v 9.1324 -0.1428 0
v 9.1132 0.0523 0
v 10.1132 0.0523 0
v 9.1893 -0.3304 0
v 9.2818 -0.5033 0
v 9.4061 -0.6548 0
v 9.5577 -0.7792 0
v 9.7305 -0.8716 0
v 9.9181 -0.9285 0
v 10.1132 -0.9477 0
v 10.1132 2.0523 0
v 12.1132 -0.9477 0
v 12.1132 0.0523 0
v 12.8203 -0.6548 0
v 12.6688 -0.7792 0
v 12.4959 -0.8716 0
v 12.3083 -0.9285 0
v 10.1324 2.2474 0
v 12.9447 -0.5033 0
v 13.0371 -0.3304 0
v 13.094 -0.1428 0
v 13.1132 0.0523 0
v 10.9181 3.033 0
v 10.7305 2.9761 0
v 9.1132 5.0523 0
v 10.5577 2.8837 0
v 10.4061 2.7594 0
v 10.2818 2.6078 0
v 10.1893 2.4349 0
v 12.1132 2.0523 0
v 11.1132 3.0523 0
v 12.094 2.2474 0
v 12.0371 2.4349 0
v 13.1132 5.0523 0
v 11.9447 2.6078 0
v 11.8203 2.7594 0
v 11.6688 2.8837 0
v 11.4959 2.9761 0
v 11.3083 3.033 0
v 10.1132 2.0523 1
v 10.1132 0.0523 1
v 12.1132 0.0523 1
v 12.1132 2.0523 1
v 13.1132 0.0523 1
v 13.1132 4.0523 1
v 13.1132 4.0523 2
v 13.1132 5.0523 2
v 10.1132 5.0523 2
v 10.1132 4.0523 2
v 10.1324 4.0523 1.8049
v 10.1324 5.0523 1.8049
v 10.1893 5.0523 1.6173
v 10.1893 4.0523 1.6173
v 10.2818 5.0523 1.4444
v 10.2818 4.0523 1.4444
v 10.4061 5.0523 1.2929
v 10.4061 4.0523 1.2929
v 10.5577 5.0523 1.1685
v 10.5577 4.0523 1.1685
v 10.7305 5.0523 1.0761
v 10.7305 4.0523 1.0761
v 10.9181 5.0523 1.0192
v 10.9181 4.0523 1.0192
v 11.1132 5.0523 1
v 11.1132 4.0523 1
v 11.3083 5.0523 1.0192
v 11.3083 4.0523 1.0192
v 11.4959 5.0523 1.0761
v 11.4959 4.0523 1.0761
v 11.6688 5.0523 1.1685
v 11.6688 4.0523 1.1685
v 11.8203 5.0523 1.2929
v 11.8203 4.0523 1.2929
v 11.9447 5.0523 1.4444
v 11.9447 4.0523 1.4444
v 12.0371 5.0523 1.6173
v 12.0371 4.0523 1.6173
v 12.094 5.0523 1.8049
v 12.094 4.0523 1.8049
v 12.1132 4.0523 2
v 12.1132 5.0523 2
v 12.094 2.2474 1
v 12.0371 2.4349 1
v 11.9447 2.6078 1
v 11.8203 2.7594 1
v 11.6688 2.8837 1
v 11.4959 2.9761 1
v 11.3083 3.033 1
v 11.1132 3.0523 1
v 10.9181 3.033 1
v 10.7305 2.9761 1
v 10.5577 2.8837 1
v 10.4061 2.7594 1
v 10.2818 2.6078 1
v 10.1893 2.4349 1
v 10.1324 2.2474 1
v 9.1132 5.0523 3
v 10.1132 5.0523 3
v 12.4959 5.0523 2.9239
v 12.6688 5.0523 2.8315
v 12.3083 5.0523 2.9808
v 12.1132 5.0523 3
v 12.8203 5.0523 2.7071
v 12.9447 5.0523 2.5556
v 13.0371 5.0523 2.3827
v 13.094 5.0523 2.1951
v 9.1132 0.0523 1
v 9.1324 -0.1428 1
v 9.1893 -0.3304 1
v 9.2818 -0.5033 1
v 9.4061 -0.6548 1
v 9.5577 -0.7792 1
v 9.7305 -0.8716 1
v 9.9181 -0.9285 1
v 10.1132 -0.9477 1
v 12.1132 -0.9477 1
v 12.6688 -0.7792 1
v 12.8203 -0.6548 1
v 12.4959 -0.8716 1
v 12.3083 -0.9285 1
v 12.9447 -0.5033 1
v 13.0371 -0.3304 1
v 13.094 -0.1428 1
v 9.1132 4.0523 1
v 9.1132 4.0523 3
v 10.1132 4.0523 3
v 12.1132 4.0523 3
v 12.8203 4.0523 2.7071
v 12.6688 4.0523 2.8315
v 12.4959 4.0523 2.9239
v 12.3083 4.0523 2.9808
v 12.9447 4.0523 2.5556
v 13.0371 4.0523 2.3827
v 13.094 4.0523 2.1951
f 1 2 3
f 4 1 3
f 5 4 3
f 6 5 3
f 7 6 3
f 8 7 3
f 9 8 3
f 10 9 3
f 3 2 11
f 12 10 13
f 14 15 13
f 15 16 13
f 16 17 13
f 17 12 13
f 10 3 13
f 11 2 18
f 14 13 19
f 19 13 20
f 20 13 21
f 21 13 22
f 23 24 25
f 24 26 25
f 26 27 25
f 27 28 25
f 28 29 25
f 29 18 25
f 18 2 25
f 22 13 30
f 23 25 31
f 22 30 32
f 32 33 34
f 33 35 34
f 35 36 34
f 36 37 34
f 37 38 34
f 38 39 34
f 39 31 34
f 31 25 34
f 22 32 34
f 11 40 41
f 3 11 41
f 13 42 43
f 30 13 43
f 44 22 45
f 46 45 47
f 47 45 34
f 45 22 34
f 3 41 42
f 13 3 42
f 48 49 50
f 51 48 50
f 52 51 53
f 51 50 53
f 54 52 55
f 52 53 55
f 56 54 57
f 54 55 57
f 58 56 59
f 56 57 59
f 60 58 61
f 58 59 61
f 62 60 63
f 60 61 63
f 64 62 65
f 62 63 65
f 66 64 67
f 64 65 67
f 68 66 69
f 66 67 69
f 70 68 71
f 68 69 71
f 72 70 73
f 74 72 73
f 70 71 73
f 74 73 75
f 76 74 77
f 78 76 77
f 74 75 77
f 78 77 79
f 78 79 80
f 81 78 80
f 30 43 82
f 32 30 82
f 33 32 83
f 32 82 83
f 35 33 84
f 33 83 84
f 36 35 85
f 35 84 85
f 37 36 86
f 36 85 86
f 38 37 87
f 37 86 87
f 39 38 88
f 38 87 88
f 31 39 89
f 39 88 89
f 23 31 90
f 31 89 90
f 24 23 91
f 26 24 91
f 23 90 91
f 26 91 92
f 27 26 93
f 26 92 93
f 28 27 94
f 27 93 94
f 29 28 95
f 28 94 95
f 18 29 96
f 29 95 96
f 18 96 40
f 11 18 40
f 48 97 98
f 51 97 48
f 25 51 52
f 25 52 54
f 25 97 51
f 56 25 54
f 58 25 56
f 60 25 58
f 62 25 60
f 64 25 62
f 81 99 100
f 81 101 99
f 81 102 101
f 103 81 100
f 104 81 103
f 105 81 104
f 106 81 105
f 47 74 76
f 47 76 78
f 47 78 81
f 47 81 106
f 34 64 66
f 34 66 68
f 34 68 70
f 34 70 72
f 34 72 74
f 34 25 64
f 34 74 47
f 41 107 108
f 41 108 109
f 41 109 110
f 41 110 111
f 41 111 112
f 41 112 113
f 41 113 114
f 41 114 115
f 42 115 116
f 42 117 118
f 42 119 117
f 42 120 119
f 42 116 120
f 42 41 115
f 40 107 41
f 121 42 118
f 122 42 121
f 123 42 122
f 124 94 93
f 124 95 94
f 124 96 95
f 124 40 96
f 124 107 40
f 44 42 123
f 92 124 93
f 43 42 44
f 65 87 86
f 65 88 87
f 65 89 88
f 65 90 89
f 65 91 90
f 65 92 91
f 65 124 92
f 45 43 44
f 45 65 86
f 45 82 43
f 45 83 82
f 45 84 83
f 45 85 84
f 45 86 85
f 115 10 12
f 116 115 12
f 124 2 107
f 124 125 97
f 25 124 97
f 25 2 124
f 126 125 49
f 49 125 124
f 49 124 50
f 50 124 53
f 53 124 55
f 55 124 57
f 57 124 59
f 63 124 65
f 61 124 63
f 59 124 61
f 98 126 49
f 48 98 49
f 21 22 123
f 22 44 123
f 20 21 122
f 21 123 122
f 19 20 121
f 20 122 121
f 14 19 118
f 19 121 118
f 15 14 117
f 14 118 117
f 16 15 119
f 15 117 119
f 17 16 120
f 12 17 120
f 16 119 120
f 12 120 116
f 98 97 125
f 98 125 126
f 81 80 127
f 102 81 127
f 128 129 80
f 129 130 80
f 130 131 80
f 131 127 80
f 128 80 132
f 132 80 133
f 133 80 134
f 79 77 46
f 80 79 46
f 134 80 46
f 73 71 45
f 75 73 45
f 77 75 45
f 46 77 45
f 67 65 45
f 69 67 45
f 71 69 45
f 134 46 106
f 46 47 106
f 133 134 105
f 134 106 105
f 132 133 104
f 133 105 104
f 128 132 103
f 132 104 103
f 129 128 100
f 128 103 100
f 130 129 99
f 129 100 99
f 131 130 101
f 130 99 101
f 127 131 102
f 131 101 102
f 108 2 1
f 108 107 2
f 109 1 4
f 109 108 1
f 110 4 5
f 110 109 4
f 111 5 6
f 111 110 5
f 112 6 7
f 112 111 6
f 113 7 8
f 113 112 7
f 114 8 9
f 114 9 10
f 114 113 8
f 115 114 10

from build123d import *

# Parameters (mm, degrees)
F0_W     = 4
F0_H     = 6
F1_DEPTH = 1
F3_DEPTH = 25
F4_W     = 4
F4_H     = 1
F5_DEPTH = 2
F6_R     = 1
F8_DEPTH = 1


with BuildPart() as f1:
    # F0 (on Top) → F1 (new body)
    with BuildSketch(Plane.XY):
        with Locations((11.1132203601, 2.0522621416)):
            Rectangle(F0_W, F0_H)
    extrude(amount=F1_DEPTH)

    # F2 (on face) → F3 (cut)
    with BuildSketch(Plane.XY.offset(1)):
        with BuildLine():
            Line((10.1132203601, 2.0522621416), (10.1132203601, 0.0522621416))
            Line((10.1132203601, 0.0522621416), (12.1132203601, 0.0522621416))
            Line((12.1132203601, 0.0522621416), (12.1132203601, 2.0522621416))
            ThreePointArc((12.1132203601, 2.0522621416), (11.1132203601, 1.0522621416), (10.1132203601, 2.0522621416))
        make_face()
        with BuildLine():
            ThreePointArc((12.1132203601, 2.0522621416), (11.1132203601, 3.0522621416), (10.1132203601, 2.0522621416))
            Line((10.1132203601, 2.0522621416), (12.1132203601, 2.0522621416))
        make_face()
        with BuildLine():
            Line((12.1132203601, 2.0522621416), (10.1132203601, 2.0522621416))
            ThreePointArc((10.1132203601, 2.0522621416), (11.1132203601, 1.0522621416), (12.1132203601, 2.0522621416))
        make_face()
    extrude(amount=-F3_DEPTH, mode=Mode.SUBTRACT)

    # F4 (on face) → F5 (join)
    with BuildSketch(Plane.XY.offset(1)):
        with Locations((11.1132203601, 4.5522621416)):
            Rectangle(F4_W, F4_H)
    extrude(amount=F5_DEPTH)

    # F6
    f6_edges = [f1.edges().sort_by_distance(p)[0] for p in [
        (13.11322, 4.552262, 3),
        (13.11322, -0.947738, 0.5),
        (9.11322, -0.947738, 0.5),
    ]]
    fillet(f6_edges, radius=F6_R)

    # F7 (on face) → F8 (cut)
    with BuildSketch(Plane.XZ.offset(-4.0522621416)):
        with BuildLine():
            Line((11.1132203601, 3), (10.1132203601, 3))
            Line((10.1132203601, 3), (10.1132203601, 2))
            ThreePointArc((10.1132203601, 2), (10.4061135789, 2.7071067812), (11.1132203601, 3))
        make_face()
        with BuildLine():
            ThreePointArc((11.1132203601, 3), (10.4061135789, 2.7071067812), (10.1132203601, 2))
            ThreePointArc((10.1132203601, 2), (11.1132203601, 1), (12.1132203601, 2))
            ThreePointArc((12.1132203601, 2), (11.8203271413, 2.7071067812), (11.1132203601, 3))
        make_face()
        with BuildLine():
            Line((12.1132203601, 3), (11.1132203601, 3))
            ThreePointArc((11.1132203601, 3), (11.8203271413, 2.7071067812), (12.1132203601, 2))
            Line((12.1132203601, 2), (12.1132203601, 3))
        make_face()
    extrude(amount=-F8_DEPTH, mode=Mode.SUBTRACT)


solid = f1.part
